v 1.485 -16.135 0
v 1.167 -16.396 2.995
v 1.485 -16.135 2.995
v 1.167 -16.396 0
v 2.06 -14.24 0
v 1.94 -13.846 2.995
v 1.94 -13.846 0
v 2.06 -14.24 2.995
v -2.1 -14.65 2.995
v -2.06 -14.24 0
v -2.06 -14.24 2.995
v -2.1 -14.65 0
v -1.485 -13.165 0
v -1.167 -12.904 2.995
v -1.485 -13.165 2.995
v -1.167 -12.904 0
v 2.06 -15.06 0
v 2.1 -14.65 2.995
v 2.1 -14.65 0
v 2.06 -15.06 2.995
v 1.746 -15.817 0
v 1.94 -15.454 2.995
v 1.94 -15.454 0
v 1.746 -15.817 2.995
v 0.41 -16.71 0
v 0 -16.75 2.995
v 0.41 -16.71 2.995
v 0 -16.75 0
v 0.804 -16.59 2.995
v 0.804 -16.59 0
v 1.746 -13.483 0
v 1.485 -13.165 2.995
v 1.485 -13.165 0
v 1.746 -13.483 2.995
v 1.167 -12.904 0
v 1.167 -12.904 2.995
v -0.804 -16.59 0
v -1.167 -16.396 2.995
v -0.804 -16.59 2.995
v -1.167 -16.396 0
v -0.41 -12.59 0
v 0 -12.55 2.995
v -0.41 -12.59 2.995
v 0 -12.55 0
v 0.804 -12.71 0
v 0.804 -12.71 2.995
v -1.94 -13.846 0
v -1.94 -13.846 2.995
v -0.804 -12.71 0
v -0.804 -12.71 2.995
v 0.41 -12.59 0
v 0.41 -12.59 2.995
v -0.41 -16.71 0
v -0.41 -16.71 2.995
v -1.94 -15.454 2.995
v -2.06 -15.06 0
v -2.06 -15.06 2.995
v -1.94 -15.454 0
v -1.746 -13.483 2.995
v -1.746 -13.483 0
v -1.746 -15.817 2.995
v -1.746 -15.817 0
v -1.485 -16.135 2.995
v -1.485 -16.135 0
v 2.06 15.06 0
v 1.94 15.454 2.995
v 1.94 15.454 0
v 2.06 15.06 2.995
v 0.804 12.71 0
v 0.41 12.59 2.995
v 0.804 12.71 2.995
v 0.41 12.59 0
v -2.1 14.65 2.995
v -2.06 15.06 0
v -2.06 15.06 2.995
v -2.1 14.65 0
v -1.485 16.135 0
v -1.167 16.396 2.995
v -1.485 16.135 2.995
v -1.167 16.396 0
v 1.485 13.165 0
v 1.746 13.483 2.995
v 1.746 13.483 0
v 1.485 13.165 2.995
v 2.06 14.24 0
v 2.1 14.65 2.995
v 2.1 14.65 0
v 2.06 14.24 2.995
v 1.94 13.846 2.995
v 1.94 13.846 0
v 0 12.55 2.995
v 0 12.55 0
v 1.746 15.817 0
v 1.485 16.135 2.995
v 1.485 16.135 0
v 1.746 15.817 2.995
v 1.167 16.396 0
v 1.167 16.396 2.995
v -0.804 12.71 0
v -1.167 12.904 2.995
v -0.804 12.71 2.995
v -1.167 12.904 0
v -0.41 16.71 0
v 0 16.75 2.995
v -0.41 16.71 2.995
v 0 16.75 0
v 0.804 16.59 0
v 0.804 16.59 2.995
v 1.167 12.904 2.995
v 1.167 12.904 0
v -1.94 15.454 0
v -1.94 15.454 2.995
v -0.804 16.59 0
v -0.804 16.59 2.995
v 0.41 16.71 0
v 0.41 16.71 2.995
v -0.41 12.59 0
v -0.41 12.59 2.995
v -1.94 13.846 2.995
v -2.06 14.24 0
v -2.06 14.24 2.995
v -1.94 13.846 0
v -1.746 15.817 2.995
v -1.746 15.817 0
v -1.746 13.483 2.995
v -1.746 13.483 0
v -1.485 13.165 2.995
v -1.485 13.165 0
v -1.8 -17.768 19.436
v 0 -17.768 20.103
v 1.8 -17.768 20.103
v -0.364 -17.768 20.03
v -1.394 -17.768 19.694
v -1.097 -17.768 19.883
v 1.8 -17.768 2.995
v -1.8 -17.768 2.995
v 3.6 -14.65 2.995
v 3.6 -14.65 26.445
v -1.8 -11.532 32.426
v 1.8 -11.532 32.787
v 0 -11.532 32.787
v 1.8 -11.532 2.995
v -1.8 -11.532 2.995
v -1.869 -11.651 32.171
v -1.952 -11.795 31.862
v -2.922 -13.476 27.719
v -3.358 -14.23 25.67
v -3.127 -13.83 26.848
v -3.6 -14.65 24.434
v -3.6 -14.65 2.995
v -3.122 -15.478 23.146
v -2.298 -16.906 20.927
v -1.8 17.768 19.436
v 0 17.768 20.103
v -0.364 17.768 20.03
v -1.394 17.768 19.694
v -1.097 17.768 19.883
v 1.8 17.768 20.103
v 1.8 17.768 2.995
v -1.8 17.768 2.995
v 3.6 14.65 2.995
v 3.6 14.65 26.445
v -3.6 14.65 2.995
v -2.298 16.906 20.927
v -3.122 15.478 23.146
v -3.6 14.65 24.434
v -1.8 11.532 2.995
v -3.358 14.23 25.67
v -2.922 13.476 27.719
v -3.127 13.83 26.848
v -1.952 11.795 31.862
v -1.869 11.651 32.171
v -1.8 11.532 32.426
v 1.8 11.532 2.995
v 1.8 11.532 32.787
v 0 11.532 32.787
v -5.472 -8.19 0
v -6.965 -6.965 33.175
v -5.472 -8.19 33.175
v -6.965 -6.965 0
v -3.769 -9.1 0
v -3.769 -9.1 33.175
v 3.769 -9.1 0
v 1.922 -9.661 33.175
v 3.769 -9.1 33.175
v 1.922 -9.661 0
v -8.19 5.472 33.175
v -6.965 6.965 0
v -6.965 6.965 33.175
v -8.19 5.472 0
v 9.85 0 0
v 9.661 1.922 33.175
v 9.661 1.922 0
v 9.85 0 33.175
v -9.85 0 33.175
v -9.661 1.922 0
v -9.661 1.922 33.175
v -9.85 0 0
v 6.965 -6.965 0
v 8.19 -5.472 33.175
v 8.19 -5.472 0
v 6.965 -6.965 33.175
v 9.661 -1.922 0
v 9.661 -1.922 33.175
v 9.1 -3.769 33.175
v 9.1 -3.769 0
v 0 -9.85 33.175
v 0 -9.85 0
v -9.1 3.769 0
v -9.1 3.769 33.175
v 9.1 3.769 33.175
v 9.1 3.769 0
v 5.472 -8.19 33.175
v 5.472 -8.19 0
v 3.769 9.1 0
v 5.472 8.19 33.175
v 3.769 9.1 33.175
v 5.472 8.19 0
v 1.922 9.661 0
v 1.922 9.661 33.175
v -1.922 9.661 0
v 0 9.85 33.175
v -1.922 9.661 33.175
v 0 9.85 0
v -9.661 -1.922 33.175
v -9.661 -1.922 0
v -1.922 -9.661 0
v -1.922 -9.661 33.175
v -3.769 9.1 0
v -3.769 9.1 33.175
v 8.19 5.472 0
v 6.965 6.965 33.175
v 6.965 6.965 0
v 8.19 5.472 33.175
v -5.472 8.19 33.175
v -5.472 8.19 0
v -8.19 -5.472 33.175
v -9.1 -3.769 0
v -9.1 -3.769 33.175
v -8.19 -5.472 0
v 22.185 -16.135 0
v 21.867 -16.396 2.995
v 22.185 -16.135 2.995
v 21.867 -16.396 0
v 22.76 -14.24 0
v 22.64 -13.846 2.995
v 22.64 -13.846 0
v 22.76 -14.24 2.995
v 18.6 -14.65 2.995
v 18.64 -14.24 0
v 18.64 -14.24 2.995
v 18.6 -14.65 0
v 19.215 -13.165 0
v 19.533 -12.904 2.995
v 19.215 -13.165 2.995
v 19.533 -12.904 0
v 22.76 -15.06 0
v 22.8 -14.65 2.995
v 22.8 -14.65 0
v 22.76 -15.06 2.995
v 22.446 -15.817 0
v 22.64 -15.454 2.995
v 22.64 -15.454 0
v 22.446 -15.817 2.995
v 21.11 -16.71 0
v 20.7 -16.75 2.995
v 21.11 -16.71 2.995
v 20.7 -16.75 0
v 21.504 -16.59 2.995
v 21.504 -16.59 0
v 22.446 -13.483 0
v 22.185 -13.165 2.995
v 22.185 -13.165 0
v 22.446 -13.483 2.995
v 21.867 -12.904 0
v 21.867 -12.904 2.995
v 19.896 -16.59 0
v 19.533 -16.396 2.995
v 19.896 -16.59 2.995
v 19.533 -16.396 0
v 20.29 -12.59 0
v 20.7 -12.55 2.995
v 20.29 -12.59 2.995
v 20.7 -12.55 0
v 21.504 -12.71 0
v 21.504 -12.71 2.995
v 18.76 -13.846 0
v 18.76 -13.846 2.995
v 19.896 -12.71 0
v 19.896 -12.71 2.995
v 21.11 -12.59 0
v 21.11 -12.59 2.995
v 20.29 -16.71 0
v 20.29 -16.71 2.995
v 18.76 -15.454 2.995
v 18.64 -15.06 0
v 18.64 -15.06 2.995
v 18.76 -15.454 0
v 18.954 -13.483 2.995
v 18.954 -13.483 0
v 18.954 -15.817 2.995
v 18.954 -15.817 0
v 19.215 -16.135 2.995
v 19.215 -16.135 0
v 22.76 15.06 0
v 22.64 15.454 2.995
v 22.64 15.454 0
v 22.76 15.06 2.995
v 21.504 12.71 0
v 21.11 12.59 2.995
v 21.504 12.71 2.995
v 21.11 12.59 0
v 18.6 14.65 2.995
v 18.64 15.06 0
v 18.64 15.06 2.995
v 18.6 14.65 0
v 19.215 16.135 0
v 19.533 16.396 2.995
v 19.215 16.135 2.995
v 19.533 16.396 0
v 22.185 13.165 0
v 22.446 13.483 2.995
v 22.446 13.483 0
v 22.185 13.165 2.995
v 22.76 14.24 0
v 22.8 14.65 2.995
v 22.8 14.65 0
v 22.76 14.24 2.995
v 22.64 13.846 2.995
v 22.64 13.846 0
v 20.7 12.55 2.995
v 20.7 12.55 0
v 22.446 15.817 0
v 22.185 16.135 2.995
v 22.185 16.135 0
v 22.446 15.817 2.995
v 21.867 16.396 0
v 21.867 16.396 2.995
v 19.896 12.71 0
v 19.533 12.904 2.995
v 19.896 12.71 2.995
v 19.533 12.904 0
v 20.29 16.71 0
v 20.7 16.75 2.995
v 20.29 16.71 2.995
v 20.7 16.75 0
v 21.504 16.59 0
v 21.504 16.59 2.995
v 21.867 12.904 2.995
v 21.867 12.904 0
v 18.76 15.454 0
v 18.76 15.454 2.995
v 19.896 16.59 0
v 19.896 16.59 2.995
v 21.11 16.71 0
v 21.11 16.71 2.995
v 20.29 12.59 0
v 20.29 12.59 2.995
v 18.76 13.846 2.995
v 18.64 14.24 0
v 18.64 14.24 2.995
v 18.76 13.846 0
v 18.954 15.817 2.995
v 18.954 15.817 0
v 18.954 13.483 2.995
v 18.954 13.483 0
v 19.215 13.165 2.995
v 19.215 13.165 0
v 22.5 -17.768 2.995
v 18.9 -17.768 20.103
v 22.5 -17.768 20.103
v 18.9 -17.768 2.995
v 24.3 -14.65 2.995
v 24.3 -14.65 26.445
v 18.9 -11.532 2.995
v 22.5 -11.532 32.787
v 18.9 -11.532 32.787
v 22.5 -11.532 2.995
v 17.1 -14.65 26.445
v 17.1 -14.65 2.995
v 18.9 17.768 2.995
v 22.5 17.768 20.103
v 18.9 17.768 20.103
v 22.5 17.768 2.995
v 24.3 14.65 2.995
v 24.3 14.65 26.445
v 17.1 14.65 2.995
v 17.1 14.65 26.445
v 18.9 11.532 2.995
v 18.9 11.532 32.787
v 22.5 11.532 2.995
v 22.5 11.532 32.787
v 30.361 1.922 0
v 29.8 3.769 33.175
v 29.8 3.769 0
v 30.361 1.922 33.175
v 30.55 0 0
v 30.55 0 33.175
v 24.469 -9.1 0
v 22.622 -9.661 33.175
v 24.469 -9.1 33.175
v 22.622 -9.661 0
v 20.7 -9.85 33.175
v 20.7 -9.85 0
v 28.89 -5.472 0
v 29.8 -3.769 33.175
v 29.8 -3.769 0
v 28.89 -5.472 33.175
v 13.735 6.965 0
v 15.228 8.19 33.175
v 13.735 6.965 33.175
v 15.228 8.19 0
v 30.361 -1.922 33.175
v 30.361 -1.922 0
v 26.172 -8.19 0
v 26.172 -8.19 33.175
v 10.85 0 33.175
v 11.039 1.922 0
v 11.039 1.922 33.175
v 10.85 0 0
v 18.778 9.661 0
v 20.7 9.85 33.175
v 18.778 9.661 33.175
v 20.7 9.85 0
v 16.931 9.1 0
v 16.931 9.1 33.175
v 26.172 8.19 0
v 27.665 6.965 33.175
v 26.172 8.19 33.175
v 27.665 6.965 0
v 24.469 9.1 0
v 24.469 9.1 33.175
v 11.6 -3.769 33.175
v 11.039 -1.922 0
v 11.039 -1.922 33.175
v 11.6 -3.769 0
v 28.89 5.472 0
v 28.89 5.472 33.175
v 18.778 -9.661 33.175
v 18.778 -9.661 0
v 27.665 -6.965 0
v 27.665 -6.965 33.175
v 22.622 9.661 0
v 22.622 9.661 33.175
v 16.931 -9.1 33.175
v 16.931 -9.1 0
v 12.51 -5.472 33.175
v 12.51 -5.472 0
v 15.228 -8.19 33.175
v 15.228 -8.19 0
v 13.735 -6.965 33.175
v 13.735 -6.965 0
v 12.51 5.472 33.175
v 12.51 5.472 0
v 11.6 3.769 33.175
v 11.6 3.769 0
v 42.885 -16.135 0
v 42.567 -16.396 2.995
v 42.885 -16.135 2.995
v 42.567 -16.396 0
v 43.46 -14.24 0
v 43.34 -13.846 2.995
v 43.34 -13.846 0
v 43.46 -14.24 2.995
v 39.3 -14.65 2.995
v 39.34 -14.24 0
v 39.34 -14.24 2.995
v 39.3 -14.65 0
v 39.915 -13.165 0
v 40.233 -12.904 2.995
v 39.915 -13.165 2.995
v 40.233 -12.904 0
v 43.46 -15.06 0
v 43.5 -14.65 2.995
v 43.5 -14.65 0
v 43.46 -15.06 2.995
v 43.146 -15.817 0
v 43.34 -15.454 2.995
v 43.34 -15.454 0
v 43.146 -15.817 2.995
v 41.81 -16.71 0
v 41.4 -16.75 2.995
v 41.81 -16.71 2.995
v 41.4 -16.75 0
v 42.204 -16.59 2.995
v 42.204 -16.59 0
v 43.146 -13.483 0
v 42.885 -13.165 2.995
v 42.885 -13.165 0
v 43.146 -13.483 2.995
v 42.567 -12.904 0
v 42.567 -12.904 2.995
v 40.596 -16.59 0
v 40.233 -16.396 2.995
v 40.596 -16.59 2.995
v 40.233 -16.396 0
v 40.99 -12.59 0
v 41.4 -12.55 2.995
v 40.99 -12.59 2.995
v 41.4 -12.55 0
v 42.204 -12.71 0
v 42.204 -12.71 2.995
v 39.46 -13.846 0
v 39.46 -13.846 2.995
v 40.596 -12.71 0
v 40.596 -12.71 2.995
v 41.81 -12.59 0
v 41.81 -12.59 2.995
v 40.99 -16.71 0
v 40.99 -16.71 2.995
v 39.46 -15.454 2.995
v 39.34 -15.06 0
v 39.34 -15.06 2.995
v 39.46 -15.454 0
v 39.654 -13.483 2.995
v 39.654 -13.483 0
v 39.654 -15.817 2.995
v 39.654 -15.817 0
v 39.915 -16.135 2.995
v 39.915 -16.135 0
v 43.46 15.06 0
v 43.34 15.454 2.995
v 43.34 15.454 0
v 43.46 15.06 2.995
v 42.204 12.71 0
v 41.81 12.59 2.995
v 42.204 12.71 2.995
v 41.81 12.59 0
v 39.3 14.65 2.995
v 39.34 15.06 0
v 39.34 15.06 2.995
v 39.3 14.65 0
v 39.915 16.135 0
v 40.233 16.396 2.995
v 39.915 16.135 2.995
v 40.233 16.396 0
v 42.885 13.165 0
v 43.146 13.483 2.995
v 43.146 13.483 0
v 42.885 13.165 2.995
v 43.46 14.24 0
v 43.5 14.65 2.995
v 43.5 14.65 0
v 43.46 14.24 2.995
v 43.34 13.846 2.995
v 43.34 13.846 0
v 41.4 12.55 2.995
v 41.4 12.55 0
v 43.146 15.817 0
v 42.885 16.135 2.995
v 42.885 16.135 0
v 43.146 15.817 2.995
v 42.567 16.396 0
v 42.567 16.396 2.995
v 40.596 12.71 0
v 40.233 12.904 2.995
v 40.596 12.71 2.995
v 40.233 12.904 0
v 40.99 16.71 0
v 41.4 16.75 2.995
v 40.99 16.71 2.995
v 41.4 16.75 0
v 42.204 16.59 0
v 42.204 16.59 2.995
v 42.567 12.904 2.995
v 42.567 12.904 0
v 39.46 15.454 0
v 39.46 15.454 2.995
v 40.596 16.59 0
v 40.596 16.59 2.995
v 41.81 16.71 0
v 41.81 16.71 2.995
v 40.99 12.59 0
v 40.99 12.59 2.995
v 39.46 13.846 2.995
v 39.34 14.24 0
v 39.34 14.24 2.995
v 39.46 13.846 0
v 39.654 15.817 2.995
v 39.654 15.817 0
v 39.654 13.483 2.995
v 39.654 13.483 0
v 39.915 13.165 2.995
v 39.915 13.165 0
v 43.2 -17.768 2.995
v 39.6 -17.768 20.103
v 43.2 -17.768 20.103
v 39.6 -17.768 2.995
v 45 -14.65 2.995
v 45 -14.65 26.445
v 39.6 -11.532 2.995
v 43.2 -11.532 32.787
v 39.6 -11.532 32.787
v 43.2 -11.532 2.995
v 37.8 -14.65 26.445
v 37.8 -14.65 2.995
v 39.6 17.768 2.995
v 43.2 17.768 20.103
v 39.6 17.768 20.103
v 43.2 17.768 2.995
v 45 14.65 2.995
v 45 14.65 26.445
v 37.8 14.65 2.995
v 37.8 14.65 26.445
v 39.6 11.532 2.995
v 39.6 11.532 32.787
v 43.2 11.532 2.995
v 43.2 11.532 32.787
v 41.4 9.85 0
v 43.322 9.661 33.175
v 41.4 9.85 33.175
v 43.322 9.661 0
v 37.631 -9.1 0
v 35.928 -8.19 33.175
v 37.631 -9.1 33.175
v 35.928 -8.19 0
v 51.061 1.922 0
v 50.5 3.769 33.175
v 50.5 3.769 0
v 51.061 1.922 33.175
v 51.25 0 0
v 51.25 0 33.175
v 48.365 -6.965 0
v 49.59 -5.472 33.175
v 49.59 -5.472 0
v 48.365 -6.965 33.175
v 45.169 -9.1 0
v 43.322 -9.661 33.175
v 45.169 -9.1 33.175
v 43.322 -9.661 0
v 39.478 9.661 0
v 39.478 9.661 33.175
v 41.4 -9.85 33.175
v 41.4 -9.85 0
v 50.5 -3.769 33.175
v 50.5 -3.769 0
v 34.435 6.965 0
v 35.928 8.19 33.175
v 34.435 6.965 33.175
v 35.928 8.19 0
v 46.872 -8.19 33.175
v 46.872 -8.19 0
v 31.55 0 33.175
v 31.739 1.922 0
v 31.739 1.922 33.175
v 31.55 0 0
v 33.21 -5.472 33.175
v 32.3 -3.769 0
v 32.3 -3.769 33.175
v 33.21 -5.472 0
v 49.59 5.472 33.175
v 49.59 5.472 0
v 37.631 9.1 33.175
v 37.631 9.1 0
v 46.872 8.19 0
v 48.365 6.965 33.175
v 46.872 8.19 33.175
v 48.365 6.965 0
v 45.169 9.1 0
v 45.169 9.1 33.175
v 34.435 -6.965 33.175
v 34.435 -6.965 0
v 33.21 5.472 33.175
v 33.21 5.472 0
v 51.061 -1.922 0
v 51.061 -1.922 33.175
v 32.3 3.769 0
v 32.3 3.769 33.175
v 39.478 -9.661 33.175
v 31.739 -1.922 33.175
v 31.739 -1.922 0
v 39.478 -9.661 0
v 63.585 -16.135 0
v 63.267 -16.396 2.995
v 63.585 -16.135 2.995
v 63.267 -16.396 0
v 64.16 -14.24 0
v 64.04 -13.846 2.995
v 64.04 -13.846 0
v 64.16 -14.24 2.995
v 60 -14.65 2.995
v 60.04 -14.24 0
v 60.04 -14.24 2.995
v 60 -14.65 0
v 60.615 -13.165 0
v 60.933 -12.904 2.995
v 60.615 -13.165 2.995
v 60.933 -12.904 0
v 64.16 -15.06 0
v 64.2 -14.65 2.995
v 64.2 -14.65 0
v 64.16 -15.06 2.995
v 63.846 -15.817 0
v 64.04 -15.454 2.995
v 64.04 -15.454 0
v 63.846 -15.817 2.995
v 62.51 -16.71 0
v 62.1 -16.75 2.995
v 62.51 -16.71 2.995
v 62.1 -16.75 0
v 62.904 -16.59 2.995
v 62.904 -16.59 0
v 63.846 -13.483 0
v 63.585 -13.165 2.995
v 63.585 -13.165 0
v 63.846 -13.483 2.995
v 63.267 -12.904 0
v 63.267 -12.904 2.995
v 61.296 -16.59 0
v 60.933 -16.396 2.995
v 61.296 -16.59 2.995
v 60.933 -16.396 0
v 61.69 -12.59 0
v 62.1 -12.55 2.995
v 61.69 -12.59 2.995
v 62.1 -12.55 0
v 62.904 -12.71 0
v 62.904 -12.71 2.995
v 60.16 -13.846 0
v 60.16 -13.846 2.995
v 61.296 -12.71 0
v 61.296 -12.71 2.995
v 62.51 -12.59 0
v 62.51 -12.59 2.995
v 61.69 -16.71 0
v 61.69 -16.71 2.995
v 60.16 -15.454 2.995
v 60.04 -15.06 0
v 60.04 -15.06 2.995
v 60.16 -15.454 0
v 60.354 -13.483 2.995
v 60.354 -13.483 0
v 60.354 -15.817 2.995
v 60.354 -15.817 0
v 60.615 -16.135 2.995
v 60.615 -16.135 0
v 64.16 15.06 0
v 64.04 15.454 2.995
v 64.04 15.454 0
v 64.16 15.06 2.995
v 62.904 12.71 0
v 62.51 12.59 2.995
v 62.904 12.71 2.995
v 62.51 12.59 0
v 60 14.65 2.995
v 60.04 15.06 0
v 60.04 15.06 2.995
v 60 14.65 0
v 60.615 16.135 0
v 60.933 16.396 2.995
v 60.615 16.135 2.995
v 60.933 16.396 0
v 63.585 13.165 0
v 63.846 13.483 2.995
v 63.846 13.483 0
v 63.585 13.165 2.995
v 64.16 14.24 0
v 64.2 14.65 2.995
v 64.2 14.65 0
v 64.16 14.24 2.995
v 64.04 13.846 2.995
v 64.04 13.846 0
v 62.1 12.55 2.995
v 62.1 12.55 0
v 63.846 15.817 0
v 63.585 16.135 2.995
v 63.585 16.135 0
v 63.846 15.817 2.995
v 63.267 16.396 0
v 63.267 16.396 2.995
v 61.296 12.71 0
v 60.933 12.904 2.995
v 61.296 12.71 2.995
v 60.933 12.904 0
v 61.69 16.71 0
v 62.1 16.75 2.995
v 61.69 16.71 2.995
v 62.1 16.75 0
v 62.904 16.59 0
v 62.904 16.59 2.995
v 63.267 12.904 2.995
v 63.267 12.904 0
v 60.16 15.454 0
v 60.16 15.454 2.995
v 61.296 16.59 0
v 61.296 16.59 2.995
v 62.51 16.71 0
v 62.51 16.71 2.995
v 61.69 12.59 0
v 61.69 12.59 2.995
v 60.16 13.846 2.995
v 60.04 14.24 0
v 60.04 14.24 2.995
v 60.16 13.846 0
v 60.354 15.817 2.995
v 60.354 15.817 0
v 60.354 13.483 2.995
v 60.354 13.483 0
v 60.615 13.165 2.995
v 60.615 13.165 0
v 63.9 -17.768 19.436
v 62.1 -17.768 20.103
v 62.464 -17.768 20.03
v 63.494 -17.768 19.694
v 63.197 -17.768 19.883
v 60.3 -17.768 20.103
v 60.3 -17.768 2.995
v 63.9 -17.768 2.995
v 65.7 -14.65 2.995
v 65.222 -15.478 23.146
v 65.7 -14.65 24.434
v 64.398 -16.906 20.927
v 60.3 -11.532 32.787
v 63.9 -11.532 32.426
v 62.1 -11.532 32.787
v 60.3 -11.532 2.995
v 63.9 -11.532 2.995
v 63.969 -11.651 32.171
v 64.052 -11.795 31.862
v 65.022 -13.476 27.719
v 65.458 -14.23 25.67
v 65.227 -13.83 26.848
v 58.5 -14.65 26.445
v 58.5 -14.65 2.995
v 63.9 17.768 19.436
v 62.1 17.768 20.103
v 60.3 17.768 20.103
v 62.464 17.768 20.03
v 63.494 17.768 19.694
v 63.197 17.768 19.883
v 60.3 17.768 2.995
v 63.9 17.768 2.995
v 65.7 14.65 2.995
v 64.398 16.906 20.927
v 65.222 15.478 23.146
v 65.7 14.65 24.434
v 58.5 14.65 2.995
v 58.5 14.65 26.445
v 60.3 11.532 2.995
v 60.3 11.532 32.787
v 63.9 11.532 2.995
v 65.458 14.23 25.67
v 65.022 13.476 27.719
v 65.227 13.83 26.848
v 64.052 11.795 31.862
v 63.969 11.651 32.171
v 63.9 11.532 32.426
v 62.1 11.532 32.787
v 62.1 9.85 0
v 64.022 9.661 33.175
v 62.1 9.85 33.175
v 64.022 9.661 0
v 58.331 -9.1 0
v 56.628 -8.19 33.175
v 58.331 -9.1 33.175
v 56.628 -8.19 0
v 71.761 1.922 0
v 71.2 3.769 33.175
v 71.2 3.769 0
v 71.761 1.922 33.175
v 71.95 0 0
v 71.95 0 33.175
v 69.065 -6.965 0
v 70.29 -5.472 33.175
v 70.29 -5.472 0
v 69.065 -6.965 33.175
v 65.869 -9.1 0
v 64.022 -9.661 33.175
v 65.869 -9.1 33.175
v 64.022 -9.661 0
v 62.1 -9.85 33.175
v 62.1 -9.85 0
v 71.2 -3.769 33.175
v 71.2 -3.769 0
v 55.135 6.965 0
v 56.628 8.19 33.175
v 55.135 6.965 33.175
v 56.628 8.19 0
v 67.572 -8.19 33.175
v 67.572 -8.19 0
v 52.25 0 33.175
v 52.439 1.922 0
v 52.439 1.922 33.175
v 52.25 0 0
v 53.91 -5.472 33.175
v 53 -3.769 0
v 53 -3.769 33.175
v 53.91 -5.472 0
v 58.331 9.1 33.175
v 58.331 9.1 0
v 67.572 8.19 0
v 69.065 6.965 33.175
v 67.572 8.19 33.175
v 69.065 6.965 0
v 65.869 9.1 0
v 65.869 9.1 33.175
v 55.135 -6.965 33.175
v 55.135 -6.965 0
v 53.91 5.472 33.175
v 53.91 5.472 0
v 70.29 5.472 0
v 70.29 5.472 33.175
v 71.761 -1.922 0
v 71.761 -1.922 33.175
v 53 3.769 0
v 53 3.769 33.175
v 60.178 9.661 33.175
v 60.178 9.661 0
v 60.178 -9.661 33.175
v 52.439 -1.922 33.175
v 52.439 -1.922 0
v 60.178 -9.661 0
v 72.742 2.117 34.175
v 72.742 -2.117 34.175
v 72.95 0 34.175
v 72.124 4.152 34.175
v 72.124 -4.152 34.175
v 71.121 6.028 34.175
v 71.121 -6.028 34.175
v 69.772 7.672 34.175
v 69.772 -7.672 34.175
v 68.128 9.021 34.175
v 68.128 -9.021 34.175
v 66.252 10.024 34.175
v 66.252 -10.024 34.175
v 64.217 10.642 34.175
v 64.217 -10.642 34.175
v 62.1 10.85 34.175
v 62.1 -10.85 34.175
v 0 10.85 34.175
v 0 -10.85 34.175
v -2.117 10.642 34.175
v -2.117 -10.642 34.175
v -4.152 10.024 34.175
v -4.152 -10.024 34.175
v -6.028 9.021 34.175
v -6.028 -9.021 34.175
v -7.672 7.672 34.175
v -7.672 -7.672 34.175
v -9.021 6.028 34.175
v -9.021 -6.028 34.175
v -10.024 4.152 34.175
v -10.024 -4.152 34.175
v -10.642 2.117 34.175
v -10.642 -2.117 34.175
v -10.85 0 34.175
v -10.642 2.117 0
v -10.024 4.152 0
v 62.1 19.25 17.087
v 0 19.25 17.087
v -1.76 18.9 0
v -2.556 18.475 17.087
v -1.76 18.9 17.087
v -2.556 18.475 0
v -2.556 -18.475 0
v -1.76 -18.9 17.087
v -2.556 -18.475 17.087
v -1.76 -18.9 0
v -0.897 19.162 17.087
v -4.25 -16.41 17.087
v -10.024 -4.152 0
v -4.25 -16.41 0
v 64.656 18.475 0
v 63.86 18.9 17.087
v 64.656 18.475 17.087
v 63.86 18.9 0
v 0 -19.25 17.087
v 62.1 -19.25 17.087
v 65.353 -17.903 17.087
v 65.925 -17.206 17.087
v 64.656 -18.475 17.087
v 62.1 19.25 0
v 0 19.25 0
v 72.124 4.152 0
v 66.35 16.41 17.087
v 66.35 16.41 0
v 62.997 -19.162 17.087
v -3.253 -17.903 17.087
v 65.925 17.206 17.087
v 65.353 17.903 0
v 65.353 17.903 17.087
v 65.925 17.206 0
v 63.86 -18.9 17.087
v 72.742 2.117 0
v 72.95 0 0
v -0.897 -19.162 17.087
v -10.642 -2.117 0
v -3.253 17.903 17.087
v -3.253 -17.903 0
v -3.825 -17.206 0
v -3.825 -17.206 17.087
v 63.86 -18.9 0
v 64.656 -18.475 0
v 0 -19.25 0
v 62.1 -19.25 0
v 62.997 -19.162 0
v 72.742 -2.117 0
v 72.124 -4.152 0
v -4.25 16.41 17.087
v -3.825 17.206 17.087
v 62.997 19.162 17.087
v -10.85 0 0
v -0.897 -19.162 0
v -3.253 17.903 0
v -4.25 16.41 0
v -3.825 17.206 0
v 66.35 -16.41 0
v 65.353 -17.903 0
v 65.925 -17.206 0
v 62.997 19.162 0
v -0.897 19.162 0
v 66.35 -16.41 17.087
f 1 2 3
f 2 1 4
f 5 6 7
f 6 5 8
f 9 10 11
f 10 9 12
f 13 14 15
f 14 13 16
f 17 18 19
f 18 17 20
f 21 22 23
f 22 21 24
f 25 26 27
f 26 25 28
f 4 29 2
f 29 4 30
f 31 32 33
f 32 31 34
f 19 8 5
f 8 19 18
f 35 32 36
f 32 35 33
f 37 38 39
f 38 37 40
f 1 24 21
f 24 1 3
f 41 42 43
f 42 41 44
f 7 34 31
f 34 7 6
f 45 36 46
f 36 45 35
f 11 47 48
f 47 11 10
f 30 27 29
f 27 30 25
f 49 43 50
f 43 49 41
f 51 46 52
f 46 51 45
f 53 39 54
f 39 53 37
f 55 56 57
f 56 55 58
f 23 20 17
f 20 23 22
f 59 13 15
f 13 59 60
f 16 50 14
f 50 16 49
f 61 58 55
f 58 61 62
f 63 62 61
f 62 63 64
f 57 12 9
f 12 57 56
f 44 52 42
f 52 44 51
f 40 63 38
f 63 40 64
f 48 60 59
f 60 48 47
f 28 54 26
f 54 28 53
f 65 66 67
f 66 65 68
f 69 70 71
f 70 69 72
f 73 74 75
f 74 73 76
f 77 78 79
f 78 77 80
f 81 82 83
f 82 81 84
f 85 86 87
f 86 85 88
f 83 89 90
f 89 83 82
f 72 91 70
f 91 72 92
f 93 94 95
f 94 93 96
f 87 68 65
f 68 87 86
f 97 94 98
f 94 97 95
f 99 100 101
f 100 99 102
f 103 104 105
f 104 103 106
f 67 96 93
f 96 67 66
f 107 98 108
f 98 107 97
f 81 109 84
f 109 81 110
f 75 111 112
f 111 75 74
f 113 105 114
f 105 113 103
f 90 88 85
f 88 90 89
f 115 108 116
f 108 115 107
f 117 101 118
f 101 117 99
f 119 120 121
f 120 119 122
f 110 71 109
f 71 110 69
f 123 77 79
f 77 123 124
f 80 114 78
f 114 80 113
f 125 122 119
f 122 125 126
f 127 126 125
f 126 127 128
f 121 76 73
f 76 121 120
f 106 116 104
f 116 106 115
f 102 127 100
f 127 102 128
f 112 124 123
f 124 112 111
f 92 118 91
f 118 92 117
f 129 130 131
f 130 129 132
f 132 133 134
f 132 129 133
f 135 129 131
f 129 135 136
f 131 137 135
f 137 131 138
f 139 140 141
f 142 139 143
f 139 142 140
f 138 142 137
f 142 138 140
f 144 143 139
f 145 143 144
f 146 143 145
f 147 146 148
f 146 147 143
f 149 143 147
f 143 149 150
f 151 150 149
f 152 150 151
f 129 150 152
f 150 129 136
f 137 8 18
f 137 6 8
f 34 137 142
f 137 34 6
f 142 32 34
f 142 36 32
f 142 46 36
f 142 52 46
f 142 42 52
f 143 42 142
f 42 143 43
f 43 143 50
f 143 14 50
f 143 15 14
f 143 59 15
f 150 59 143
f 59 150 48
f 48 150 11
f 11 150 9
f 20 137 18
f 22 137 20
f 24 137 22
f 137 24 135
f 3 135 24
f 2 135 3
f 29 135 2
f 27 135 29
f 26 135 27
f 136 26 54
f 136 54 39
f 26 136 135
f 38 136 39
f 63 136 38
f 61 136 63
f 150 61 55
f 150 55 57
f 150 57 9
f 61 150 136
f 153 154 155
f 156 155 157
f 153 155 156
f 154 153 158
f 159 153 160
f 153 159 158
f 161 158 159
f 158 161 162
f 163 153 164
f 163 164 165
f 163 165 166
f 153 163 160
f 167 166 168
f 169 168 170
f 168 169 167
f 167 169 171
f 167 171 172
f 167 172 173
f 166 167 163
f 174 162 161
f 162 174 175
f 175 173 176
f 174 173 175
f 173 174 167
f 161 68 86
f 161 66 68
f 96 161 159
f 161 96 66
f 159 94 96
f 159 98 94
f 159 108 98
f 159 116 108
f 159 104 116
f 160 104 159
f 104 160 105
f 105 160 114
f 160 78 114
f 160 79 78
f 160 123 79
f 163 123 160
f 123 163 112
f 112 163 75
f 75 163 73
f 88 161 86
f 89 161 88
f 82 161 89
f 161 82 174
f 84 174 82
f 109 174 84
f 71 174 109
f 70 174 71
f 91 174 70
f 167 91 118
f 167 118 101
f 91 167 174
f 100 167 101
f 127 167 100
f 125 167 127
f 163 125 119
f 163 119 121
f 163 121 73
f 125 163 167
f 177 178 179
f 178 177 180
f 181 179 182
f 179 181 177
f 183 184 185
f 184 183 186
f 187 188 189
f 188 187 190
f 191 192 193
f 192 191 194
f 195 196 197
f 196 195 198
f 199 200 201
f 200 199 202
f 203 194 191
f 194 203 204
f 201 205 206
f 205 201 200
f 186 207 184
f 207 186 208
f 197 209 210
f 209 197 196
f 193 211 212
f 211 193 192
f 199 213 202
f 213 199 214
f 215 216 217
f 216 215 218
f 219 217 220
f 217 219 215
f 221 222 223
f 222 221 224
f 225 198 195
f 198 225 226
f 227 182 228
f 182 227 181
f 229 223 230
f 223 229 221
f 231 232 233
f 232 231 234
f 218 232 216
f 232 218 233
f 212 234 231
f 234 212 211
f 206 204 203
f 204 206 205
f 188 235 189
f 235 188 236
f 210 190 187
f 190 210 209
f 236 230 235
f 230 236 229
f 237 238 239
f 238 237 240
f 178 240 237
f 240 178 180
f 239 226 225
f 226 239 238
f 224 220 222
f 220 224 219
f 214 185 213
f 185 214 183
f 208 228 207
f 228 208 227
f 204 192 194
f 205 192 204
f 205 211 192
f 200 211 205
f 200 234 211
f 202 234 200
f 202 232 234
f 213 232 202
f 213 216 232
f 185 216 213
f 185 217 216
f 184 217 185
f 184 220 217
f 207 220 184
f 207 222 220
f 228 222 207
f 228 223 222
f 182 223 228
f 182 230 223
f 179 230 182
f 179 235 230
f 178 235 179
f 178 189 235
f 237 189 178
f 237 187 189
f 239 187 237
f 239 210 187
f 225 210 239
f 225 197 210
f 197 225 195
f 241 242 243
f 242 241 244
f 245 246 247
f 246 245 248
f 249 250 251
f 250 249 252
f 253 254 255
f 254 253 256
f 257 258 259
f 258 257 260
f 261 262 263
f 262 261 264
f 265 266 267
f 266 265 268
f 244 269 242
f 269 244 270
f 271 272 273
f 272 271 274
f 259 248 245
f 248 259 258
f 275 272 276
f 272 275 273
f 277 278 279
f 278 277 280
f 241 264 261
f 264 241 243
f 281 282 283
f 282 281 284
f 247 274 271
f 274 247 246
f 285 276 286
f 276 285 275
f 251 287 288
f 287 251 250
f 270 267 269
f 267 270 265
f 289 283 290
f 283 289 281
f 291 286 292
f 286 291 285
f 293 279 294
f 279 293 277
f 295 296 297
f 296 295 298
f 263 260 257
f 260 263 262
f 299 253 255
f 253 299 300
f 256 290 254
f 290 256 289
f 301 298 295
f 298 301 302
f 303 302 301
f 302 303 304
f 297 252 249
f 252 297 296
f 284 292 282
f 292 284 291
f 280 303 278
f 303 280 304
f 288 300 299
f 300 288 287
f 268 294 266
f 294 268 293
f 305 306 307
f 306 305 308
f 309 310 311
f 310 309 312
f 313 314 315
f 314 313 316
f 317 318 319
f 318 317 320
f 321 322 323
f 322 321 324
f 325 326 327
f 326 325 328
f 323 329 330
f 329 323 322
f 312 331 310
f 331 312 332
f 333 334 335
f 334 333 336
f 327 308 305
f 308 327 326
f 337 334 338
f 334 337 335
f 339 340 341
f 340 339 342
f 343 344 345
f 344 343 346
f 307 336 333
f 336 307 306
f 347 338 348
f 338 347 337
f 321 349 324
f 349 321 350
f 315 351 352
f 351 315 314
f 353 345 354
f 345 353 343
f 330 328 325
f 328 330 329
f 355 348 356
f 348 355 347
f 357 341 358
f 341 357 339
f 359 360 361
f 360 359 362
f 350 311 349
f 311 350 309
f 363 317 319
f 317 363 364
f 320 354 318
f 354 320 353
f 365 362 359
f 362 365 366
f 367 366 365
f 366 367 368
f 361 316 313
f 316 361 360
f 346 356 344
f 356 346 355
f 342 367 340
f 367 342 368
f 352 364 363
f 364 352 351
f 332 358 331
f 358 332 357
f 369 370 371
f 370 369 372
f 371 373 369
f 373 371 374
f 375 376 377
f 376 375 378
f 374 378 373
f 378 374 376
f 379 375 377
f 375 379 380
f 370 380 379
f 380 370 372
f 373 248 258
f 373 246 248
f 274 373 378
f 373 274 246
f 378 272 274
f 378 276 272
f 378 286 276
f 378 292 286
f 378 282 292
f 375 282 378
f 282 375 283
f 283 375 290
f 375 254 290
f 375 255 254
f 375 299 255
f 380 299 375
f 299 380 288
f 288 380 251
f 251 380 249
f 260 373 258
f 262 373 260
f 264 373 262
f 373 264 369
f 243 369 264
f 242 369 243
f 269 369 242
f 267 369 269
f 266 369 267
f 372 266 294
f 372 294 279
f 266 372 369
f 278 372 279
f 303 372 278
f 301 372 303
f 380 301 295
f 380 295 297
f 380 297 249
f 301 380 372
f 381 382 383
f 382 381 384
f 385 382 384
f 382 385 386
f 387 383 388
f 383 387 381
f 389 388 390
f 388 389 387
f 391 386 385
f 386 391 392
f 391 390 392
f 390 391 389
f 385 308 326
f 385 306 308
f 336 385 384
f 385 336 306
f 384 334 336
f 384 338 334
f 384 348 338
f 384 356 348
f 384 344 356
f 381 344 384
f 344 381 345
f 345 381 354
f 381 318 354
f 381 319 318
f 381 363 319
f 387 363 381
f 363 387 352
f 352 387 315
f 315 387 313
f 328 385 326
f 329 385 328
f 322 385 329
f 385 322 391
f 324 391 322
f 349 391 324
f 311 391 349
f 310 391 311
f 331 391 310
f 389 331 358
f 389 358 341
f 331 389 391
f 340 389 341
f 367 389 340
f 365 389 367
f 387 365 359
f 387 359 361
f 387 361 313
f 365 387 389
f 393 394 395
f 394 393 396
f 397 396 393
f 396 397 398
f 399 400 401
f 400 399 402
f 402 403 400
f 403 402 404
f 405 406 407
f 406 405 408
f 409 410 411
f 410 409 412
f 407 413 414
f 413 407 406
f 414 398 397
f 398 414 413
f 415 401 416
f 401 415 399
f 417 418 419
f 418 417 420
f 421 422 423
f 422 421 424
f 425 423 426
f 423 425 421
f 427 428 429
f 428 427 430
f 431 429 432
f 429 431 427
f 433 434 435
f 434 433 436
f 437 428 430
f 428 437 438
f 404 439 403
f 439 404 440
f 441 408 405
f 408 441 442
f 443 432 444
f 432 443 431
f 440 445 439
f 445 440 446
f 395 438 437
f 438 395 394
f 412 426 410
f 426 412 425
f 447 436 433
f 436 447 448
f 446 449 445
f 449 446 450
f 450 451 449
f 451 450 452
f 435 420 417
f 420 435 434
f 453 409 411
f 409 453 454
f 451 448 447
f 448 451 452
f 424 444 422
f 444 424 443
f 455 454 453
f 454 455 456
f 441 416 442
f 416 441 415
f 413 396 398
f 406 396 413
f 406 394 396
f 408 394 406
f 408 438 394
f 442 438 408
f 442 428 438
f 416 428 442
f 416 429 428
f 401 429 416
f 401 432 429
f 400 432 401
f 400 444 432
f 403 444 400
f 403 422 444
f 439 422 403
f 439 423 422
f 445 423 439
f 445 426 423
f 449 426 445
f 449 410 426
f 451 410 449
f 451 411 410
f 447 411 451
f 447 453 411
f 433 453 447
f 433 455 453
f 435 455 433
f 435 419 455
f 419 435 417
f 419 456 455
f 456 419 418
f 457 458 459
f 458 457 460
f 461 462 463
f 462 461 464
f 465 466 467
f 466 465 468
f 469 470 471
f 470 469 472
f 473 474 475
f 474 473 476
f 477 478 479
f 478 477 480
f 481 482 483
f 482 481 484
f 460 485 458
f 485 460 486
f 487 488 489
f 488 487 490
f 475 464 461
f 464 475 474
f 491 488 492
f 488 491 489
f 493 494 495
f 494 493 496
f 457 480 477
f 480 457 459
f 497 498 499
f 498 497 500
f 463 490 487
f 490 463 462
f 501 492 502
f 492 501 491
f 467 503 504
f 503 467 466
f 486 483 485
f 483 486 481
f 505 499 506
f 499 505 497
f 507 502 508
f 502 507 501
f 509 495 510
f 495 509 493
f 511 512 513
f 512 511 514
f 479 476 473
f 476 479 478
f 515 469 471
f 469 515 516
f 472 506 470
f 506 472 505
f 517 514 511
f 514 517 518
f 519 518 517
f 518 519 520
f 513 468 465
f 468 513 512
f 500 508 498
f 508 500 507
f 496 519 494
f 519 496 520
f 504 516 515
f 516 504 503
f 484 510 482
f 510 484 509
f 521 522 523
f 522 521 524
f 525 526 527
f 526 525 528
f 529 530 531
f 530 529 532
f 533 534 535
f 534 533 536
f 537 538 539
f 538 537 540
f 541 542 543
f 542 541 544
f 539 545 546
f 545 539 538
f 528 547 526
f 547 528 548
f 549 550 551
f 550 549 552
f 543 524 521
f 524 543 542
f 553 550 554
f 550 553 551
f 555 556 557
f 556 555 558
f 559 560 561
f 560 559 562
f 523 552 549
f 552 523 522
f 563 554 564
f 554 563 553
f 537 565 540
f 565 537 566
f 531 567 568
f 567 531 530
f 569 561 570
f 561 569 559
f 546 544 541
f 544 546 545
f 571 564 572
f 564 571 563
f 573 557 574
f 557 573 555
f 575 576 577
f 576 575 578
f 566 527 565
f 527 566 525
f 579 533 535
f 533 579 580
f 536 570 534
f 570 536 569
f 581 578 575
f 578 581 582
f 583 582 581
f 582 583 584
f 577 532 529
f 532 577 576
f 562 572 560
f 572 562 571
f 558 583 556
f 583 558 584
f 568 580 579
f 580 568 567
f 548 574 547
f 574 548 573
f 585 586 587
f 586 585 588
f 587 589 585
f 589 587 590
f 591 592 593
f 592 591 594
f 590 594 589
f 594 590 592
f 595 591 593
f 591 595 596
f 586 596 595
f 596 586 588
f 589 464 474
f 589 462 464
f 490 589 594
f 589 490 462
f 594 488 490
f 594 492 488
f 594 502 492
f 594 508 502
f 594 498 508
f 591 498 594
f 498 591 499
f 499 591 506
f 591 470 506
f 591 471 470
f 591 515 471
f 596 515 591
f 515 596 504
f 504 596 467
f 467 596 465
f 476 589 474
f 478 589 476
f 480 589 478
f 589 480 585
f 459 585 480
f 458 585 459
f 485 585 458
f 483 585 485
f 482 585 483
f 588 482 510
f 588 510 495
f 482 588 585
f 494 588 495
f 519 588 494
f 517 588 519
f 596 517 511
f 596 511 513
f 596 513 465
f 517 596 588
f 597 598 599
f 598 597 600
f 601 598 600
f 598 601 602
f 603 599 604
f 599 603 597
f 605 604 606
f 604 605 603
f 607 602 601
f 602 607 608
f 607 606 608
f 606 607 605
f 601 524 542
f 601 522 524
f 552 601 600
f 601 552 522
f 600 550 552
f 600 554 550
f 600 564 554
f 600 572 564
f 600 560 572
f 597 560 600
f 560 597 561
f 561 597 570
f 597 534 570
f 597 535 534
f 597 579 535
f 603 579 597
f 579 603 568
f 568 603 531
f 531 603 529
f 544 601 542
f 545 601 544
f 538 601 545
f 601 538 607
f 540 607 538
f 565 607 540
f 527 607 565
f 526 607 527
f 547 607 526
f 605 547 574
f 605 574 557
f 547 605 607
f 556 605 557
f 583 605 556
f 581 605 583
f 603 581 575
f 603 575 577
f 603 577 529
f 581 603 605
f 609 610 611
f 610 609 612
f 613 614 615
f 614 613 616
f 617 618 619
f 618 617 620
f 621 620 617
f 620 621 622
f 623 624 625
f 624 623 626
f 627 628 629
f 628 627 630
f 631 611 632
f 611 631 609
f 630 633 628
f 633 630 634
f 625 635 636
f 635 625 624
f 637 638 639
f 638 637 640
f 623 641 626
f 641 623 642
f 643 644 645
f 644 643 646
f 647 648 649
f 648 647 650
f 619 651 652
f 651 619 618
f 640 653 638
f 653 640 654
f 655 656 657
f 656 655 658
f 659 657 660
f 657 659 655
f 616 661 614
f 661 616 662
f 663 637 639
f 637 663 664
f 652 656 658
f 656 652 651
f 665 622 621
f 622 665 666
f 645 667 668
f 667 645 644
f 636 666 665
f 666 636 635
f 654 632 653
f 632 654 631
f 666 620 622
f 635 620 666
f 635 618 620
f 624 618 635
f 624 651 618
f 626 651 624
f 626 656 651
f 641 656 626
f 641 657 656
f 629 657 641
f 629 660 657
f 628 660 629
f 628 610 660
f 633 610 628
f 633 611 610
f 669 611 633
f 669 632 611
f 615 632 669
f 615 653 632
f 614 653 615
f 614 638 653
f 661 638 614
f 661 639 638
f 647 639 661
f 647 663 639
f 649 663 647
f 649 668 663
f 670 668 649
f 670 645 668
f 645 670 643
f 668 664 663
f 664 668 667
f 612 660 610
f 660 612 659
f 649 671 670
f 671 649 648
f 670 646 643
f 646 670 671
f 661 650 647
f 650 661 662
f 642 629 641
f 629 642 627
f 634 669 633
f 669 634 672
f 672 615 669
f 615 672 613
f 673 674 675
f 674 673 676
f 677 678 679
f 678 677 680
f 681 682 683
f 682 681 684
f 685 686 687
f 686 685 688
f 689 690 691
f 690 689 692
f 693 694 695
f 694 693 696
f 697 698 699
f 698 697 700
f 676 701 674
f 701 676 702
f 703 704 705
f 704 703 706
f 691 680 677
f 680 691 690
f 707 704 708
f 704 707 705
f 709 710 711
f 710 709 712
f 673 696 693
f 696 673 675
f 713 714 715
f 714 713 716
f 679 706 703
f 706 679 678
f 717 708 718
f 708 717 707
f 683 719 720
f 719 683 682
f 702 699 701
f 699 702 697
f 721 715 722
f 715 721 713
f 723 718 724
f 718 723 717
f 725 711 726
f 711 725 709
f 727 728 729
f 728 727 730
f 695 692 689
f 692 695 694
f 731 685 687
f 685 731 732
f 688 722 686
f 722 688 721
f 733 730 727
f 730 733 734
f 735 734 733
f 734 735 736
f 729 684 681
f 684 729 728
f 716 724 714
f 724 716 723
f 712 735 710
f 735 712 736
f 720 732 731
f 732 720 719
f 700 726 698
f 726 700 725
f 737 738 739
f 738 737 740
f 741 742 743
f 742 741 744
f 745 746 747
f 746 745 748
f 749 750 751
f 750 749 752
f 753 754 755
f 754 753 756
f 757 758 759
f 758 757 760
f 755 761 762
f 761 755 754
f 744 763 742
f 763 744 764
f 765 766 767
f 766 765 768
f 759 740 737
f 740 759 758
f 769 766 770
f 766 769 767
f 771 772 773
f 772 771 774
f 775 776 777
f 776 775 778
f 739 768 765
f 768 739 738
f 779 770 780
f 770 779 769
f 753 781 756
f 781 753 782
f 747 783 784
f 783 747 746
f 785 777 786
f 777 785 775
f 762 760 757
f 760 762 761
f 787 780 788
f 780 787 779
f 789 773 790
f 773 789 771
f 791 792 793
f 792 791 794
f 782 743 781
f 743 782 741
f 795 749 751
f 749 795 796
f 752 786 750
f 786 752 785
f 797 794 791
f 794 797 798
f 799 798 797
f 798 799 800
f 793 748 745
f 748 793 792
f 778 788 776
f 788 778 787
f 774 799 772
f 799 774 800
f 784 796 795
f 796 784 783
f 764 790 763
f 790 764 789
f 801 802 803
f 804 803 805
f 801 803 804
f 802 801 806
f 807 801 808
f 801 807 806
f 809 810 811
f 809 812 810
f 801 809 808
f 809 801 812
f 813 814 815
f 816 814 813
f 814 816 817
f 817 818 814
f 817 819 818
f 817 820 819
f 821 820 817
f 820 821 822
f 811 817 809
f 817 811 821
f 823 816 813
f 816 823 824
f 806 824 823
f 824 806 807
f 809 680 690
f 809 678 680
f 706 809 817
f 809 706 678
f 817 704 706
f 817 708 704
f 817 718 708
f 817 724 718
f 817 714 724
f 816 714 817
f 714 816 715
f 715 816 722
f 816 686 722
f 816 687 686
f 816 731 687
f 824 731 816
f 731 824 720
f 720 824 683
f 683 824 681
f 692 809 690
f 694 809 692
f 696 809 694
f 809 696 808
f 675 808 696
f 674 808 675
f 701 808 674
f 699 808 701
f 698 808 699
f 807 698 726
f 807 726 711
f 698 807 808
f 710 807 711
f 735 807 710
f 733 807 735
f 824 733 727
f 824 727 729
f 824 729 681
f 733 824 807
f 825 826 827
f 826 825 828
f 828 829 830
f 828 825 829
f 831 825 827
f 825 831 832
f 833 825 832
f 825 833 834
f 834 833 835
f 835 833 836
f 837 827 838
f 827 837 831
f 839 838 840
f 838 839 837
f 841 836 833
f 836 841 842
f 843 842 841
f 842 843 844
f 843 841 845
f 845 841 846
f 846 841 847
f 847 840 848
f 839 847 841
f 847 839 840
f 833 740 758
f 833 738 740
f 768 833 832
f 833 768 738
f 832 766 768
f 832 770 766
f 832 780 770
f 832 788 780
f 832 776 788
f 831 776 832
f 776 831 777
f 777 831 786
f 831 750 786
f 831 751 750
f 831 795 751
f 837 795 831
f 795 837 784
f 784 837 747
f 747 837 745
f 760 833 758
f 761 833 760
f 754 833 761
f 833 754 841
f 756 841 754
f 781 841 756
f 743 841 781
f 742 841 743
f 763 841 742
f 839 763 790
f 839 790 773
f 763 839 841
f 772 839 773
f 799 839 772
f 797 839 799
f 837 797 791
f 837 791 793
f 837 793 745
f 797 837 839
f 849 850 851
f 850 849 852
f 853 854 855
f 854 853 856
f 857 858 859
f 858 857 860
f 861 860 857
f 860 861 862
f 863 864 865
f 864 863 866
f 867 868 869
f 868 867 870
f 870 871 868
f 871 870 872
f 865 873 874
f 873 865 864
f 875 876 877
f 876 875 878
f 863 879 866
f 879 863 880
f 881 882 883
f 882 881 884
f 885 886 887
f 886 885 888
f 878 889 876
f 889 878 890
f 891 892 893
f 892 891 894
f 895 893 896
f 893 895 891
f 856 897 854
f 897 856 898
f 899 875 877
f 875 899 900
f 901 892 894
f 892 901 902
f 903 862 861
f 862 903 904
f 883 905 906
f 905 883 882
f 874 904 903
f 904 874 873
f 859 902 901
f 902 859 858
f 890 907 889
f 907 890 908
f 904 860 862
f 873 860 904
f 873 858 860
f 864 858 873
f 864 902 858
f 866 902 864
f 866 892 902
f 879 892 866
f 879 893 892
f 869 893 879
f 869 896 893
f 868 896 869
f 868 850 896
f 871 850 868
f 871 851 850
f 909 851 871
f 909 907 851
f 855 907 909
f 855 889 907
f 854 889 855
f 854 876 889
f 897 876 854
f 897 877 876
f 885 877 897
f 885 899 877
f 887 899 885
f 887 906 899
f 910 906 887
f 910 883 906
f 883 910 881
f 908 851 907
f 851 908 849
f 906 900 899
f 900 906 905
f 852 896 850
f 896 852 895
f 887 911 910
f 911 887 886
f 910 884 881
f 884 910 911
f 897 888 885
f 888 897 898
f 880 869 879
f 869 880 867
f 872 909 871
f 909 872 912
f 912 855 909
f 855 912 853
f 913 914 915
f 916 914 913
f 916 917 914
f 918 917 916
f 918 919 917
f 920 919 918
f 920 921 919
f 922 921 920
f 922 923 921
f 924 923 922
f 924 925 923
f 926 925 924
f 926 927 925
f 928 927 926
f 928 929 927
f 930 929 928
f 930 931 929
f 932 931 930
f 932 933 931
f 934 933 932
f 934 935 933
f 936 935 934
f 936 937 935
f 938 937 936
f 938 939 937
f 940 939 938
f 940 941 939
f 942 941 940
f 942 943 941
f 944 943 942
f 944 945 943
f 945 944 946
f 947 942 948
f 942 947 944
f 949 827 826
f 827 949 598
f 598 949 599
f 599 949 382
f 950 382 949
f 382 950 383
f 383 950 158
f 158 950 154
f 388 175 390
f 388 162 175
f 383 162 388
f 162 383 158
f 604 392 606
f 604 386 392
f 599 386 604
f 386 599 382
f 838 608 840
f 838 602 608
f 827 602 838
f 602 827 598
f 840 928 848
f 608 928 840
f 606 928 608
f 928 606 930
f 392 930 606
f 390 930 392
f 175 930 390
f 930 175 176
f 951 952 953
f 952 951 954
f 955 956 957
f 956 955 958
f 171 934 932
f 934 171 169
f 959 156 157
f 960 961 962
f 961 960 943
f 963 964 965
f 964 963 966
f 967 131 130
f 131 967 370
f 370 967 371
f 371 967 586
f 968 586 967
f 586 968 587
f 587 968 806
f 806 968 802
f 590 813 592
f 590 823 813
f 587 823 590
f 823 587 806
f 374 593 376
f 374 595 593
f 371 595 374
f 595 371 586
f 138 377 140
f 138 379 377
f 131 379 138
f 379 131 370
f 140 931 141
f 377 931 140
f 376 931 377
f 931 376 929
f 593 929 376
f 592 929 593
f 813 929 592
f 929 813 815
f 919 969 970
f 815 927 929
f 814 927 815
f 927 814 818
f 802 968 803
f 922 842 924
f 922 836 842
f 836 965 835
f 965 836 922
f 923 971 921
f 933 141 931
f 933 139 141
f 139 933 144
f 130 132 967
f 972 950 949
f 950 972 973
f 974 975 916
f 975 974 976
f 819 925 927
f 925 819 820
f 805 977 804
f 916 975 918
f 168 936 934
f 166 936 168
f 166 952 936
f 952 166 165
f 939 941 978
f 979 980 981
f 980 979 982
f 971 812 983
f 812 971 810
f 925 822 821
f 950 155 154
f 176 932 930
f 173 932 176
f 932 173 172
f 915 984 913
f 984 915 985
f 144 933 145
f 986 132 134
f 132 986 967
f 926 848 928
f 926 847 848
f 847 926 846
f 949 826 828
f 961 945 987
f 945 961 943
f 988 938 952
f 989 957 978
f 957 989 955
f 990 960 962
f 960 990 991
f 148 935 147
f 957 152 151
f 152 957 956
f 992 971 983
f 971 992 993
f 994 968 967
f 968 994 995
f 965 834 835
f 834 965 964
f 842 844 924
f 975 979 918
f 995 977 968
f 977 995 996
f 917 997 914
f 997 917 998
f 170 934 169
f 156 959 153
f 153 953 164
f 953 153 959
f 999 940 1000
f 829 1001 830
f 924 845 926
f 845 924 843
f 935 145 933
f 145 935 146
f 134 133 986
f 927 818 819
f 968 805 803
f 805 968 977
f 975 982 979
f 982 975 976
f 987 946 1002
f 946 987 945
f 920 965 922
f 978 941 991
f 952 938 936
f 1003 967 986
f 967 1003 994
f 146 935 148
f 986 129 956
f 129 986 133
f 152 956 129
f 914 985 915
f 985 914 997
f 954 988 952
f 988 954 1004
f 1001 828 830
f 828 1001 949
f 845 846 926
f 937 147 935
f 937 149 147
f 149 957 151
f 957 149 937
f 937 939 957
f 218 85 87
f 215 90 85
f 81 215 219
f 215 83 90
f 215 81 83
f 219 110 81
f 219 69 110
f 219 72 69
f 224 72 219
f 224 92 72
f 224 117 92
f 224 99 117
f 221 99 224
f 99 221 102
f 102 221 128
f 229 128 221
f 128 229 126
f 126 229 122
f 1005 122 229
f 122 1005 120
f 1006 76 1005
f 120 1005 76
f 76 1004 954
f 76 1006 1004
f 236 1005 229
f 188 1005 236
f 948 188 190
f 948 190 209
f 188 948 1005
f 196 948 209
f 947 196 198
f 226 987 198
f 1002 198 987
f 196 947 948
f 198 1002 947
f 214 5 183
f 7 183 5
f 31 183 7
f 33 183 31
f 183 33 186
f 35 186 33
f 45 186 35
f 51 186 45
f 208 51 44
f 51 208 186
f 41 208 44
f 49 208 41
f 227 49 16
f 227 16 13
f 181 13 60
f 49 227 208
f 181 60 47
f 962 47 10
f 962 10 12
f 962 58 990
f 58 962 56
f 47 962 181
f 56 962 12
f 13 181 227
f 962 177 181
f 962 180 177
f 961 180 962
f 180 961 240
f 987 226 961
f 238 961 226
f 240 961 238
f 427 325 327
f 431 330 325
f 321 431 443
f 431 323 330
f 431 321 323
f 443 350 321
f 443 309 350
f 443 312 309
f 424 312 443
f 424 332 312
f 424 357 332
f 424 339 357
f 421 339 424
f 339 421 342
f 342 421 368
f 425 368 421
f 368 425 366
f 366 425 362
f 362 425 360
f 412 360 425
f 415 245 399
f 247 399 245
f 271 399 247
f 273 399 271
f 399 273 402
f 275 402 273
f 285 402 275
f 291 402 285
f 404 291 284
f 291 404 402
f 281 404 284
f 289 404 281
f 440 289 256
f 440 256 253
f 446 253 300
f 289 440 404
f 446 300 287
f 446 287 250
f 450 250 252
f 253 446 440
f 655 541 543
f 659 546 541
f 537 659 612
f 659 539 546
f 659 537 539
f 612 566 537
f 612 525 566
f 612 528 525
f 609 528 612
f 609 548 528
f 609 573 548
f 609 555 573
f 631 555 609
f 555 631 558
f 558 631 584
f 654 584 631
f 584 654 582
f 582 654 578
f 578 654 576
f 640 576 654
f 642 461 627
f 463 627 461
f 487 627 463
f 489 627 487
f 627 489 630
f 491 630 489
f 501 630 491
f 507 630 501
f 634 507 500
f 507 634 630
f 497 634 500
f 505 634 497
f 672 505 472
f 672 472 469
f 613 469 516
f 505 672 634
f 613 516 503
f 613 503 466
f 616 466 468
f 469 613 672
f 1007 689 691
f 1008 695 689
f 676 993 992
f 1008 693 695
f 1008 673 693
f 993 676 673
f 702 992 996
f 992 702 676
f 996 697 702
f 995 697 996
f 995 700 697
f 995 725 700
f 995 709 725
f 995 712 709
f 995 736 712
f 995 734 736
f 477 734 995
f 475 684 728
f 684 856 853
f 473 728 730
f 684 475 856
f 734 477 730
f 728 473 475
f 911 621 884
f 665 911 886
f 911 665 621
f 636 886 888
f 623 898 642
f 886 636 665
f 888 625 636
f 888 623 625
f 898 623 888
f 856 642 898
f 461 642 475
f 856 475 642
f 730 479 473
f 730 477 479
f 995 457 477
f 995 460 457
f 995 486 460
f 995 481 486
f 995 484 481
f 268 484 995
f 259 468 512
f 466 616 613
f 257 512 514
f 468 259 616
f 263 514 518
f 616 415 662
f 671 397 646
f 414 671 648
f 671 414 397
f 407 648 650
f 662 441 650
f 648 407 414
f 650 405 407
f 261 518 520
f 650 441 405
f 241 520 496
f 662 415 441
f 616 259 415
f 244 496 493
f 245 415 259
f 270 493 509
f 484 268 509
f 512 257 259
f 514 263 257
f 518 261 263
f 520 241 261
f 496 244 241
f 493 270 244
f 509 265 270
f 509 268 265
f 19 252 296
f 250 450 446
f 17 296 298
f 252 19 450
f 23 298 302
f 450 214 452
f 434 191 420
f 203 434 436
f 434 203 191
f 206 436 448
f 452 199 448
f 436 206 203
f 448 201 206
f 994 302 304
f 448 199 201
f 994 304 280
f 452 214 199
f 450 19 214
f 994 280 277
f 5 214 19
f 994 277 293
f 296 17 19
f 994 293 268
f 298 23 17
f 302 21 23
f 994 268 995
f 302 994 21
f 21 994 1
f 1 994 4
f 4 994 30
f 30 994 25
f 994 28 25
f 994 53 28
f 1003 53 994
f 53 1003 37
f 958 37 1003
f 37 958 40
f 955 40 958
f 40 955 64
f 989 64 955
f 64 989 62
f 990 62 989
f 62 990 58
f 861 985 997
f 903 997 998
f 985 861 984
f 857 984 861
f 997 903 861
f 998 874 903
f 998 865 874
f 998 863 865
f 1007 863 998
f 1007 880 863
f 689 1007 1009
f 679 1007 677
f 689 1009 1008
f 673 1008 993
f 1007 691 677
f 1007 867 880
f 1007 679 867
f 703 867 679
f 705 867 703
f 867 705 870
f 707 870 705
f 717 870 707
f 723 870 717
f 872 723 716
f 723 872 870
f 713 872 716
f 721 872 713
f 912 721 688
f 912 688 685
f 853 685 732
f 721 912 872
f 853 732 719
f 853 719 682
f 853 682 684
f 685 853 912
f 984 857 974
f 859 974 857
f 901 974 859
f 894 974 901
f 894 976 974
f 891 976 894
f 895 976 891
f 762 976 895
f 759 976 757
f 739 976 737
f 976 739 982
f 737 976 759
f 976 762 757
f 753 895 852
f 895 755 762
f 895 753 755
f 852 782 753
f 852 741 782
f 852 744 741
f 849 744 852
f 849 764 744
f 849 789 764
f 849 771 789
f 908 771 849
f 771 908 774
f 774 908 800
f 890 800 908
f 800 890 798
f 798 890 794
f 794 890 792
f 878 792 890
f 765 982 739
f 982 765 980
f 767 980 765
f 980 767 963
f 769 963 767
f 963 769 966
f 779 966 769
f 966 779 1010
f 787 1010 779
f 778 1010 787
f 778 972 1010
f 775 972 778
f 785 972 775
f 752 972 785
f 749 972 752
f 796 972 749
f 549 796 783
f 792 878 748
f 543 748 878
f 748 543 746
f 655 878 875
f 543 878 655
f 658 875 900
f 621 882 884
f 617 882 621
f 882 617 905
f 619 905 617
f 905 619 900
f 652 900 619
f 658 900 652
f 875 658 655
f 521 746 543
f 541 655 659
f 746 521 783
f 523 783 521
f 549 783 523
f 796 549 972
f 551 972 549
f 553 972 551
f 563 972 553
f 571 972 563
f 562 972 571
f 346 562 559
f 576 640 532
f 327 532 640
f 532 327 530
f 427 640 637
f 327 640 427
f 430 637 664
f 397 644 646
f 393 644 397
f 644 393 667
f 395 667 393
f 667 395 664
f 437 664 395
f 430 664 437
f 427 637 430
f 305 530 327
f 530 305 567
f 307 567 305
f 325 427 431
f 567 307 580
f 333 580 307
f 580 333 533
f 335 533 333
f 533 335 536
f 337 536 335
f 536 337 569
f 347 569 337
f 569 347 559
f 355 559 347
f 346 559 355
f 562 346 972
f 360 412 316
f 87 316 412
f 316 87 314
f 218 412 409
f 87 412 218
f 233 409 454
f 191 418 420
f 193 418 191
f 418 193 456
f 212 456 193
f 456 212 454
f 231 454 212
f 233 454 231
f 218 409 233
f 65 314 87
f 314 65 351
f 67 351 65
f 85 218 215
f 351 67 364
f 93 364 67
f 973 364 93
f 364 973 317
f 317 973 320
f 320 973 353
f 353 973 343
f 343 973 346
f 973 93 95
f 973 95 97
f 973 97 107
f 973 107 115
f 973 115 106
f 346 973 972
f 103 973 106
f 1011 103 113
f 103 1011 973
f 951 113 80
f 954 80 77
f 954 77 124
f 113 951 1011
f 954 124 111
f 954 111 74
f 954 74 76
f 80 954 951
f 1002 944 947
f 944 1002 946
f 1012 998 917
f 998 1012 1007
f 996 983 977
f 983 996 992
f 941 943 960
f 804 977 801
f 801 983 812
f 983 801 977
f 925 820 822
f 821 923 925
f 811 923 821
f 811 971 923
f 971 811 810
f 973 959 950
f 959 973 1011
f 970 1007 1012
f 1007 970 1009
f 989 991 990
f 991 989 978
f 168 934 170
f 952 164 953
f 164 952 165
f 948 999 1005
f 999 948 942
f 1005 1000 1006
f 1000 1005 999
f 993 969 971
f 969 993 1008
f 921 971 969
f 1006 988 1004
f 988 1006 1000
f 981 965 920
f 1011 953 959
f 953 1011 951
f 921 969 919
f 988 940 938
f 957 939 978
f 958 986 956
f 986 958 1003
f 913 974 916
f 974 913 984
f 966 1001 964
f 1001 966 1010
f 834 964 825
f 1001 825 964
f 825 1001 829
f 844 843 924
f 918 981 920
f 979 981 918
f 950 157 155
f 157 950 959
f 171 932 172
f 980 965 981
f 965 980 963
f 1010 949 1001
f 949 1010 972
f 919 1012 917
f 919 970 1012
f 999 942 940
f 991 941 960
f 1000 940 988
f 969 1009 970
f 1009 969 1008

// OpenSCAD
d18650 = 18.5;
h18650 = 65.15;
dbolt = 6;
dboltthrad = 3;
delta = 0.6;
th = 1;
n = 4;


//cylinder(d=d18650, h=h18650, center=true, $fn=32);

/*
    translate([0,0,0.5*(h18650+2*delta-0.5*(h18650+2*th+2*delta))+th]) {
        cylinder(d=d18650+2*th+2*delta, h=0.5*(h18650+2*th+2*delta), center=true, $fn=32);
        translate([0,-0.5*(d18650+2*th+2*delta+dbolt+th+delta),0])
            cylinder(d=dbolt+2*th+2*delta, h=0.5*(h18650+2*th+2*delta), center=true, $fn=32);
        translate([0,0.5*(d18650+2*th+2*delta+dbolt+th+delta),0])
            cylinder(d=dbolt+2*th+2*delta, h=0.5*(h18650+2*th+2*delta), center=true, $fn=32);
    }
*/
difference() {
    translate([0,0,0.5*(h18650+2*delta-0.5*(h18650+2*th+2*delta))+th]) {
        hull() {
            for (x=[0:n-1]) {
                translate([x*(d18650+th+2*delta),0,0]) {
                    cylinder(d=d18650+2*th+2*delta, h=0.5*(h18650+2*th+2*delta), center=true, $fn=32);
                    translate([0,-0.5*(d18650+2*th+2*delta+dbolt+th+delta),-0.125*(h18650+2*th+2*delta)])
                        cylinder(d=dbolt+2*th+2*delta, h=0.25*(h18650+2*th+2*delta), center=true, $fn=32);
                    translate([0,0.5*(d18650+2*th+2*delta+dbolt+th+delta),-0.125*(h18650+2*th+2*delta)])
                        cylinder(d=dbolt+2*th+2*delta, h=0.25*(h18650+2*th+2*delta), center=true, $fn=32);
                }
            }
        }
    }
    for (x=[0:n-1]) {
        translate([x*(d18650+th+2*delta),0,0]) {
            cylinder(d=d18650+2*delta, h=h18650+2*delta, center=true, $fn=32);
            translate([0,0,0.5*(h18650+2*delta-0.5*(h18650+2*th+2*delta))+th]) {
                translate([0,-0.5*(d18650+2*th+2*delta+dbolt+th+delta),0])
                    cylinder(d=dboltthrad+2*delta, h=0.5*(h18650+2*th+2*delta)+0.01, center=true, $fn=32);
                translate([0,0.5*(d18650+2*th+2*delta+dbolt+th+delta),0])
                    cylinder(d=dboltthrad+2*delta, h=0.5*(h18650+2*th+2*delta)+0.01, center=true, $fn=32);
                
                translate([0,-0.5*(d18650+2*th+2*delta+dbolt+th+delta),3*th])
                    cylinder(d=dbolt+2*delta, h=0.5*(h18650+2*th+2*delta)+0.01, center=true, $fn=6);
                translate([0,0.5*(d18650+2*th+2*delta+dbolt+th+delta),3*th])
                    cylinder(d=dbolt+2*delta, h=0.5*(h18650+2*th+2*delta)+0.01, center=true, $fn=6);
                
            }
        }
    }
}
